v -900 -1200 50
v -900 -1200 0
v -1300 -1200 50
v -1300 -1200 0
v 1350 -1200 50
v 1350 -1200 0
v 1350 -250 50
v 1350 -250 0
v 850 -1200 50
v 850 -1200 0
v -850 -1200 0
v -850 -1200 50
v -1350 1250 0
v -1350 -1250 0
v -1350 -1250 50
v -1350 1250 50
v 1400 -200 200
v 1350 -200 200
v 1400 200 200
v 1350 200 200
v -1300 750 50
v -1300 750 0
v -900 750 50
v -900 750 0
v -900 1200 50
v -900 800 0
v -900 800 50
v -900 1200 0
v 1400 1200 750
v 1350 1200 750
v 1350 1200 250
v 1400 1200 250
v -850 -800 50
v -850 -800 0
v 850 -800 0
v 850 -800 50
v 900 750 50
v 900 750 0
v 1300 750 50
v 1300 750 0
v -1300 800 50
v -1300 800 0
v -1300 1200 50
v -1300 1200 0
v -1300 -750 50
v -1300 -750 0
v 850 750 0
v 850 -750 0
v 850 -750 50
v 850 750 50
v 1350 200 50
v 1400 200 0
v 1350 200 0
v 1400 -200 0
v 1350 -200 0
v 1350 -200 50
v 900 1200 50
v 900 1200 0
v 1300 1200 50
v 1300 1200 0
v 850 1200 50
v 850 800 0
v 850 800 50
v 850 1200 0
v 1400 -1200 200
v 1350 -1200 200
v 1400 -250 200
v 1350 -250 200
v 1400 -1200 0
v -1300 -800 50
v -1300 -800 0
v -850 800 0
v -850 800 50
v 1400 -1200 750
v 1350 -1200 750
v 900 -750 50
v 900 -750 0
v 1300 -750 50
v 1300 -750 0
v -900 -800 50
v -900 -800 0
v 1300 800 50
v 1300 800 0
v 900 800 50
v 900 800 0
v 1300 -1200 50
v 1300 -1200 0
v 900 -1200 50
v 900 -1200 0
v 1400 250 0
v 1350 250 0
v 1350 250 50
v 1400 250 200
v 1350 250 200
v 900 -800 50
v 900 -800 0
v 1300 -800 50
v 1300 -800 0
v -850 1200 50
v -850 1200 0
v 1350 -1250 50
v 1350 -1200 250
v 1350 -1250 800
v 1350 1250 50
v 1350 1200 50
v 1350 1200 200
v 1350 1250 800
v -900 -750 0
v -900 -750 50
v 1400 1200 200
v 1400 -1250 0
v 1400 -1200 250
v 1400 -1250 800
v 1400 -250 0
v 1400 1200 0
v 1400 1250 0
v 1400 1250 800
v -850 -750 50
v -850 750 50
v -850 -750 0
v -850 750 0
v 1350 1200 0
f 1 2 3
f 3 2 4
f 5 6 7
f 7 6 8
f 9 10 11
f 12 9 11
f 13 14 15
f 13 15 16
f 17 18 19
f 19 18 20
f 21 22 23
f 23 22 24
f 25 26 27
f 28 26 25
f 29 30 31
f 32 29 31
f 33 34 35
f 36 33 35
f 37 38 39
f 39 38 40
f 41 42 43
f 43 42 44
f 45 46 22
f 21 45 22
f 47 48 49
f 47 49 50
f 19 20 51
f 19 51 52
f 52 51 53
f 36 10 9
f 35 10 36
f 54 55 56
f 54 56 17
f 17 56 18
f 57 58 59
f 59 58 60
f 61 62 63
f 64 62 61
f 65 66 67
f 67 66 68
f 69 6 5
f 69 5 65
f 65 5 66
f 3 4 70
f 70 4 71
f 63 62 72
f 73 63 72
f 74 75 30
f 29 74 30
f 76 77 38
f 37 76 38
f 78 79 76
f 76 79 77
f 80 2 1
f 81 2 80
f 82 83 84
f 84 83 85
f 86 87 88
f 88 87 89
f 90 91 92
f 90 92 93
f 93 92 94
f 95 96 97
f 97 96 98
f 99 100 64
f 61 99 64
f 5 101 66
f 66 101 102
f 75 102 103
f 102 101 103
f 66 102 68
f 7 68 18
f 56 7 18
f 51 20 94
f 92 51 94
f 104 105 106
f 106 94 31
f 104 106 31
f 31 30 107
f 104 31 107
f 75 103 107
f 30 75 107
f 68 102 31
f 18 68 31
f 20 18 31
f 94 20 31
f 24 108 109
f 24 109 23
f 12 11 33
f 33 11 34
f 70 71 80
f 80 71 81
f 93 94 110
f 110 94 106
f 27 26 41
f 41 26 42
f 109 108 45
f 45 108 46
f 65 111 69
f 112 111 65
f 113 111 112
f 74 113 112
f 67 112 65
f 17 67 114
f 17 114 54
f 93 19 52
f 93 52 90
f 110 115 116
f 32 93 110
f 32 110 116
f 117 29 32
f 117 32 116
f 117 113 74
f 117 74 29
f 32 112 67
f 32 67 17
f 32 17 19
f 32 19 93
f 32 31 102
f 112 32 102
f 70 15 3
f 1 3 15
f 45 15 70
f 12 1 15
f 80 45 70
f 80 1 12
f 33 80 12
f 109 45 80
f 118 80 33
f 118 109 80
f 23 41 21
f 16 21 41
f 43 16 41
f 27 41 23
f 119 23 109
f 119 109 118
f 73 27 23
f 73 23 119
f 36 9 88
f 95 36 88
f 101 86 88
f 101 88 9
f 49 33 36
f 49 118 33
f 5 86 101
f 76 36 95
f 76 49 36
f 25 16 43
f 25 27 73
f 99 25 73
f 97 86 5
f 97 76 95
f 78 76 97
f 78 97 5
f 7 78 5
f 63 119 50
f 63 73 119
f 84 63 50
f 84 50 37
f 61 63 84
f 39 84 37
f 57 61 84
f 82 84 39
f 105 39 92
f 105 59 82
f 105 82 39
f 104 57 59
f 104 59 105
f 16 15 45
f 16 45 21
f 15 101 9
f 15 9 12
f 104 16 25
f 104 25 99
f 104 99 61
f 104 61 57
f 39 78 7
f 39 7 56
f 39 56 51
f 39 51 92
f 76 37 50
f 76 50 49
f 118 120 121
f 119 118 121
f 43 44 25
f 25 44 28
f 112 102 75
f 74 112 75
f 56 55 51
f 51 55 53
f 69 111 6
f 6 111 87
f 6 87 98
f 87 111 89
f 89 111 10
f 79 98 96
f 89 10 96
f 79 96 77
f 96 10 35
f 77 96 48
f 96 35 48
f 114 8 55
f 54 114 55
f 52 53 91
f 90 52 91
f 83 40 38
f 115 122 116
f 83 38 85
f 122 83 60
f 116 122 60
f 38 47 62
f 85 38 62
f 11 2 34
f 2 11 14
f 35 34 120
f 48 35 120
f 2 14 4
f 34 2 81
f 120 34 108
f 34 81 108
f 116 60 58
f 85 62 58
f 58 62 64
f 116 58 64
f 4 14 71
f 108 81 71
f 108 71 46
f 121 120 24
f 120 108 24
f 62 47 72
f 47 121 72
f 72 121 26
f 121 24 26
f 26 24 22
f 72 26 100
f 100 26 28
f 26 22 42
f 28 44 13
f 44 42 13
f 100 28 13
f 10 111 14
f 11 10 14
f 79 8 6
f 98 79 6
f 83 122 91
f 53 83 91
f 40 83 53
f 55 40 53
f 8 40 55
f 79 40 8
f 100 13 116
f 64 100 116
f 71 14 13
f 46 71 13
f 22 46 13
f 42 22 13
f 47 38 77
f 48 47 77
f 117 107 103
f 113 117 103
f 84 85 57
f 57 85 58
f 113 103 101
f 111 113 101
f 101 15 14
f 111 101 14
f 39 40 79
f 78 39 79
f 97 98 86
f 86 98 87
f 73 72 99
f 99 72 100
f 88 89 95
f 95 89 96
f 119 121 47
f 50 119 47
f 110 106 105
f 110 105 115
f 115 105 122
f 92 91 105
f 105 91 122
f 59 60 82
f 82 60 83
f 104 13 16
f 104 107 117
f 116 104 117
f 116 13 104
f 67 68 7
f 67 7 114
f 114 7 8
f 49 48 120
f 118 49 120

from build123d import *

# Parameters (mm, degrees)
F0_W     = 2700
F0_H     = 2500
F0_W_2   = 50
F0_H_2   = 400
F0_H_3   = 1500
F1_DEPTH = 50
F2_W     = 50
F2_H     = 50
F2_H_2   = 150
F3_DEPTH = 50


with BuildPart() as f1:
    # F0 (on Top) → F1 (new body)
    with BuildSketch(Plane.XY):
        Rectangle(F0_W, F0_H)
        Polygon((900, 1200), (1300, 1200), (1300, 800), (1300, 750), (1300, -750), (1300, -800), (1300, -1200), (900, -1200), (850, -1200), (-850, -1200), (-900, -1200), (-1300, -1200), (-1300, -800), (-1300, -750), (-1300, 750), (-1300, 800), (-1300, 1200), (-900, 1200), (-850, 1200), (850, 1200), align=None, mode=Mode.SUBTRACT)
        with Locations((-875, 1000)):
            Rectangle(F0_W_2, F0_H_2)
        Polygon((1300, 750), (1300, 800), (900, 800), (850, 800), (-850, 800), (-900, 800), (-1300, 800), (-1300, 750), (-900, 750), (-850, 750), (850, 750), (900, 750), align=None)
        with Locations((-875, 0)):
            Rectangle(F0_W_2, F0_H_3)
        with Locations((875, 1000)):
            Rectangle(F0_W_2, F0_H_2)
        Polygon((1300, -800), (1300, -750), (900, -750), (850, -750), (-850, -750), (-900, -750), (-1300, -750), (-1300, -800), (-900, -800), (-850, -800), (850, -800), (900, -800), align=None)
        with Locations((875, 0)):
            Rectangle(F0_W_2, F0_H_3)
        with Locations((875, -1000)):
            Rectangle(F0_W_2, F0_H_2)
        with Locations((-875, -1000)):
            Rectangle(F0_W_2, F0_H_2)
    extrude(amount=F1_DEPTH)

    # F2 (on face) → F3 (join)
    with BuildSketch(Plane.YZ.offset(1350)):
        with Locations((-1225, 25)):
            Rectangle(F2_W, F2_H)
        with Locations((1225, 25)):
            Rectangle(F2_W, F2_H)
        Polygon((-1250, 800), (-1250, 50), (-1200, 50), (-1200, 200), (-1200, 250), (-1200, 750), (1200, 750), (1200, 250), (1200, 200), (1200, 50), (1250, 50), (1250, 800), align=None)
        Polygon((-1200, 250), (-1200, 200), (-250, 200), (-200, 200), (200, 200), (250, 200), (1200, 200), (1200, 250), align=None)
        with Locations((-225, 125)):
            Rectangle(F2_W, F2_H_2)
        with Locations((225, 125)):
            Rectangle(F2_W, F2_H_2)
        with Locations((225, 25)):
            Rectangle(F2_W, F2_H)
        with Locations((-225, 25)):
            Rectangle(F2_W, F2_H)
    extrude(amount=F3_DEPTH)


solid = f1.part
